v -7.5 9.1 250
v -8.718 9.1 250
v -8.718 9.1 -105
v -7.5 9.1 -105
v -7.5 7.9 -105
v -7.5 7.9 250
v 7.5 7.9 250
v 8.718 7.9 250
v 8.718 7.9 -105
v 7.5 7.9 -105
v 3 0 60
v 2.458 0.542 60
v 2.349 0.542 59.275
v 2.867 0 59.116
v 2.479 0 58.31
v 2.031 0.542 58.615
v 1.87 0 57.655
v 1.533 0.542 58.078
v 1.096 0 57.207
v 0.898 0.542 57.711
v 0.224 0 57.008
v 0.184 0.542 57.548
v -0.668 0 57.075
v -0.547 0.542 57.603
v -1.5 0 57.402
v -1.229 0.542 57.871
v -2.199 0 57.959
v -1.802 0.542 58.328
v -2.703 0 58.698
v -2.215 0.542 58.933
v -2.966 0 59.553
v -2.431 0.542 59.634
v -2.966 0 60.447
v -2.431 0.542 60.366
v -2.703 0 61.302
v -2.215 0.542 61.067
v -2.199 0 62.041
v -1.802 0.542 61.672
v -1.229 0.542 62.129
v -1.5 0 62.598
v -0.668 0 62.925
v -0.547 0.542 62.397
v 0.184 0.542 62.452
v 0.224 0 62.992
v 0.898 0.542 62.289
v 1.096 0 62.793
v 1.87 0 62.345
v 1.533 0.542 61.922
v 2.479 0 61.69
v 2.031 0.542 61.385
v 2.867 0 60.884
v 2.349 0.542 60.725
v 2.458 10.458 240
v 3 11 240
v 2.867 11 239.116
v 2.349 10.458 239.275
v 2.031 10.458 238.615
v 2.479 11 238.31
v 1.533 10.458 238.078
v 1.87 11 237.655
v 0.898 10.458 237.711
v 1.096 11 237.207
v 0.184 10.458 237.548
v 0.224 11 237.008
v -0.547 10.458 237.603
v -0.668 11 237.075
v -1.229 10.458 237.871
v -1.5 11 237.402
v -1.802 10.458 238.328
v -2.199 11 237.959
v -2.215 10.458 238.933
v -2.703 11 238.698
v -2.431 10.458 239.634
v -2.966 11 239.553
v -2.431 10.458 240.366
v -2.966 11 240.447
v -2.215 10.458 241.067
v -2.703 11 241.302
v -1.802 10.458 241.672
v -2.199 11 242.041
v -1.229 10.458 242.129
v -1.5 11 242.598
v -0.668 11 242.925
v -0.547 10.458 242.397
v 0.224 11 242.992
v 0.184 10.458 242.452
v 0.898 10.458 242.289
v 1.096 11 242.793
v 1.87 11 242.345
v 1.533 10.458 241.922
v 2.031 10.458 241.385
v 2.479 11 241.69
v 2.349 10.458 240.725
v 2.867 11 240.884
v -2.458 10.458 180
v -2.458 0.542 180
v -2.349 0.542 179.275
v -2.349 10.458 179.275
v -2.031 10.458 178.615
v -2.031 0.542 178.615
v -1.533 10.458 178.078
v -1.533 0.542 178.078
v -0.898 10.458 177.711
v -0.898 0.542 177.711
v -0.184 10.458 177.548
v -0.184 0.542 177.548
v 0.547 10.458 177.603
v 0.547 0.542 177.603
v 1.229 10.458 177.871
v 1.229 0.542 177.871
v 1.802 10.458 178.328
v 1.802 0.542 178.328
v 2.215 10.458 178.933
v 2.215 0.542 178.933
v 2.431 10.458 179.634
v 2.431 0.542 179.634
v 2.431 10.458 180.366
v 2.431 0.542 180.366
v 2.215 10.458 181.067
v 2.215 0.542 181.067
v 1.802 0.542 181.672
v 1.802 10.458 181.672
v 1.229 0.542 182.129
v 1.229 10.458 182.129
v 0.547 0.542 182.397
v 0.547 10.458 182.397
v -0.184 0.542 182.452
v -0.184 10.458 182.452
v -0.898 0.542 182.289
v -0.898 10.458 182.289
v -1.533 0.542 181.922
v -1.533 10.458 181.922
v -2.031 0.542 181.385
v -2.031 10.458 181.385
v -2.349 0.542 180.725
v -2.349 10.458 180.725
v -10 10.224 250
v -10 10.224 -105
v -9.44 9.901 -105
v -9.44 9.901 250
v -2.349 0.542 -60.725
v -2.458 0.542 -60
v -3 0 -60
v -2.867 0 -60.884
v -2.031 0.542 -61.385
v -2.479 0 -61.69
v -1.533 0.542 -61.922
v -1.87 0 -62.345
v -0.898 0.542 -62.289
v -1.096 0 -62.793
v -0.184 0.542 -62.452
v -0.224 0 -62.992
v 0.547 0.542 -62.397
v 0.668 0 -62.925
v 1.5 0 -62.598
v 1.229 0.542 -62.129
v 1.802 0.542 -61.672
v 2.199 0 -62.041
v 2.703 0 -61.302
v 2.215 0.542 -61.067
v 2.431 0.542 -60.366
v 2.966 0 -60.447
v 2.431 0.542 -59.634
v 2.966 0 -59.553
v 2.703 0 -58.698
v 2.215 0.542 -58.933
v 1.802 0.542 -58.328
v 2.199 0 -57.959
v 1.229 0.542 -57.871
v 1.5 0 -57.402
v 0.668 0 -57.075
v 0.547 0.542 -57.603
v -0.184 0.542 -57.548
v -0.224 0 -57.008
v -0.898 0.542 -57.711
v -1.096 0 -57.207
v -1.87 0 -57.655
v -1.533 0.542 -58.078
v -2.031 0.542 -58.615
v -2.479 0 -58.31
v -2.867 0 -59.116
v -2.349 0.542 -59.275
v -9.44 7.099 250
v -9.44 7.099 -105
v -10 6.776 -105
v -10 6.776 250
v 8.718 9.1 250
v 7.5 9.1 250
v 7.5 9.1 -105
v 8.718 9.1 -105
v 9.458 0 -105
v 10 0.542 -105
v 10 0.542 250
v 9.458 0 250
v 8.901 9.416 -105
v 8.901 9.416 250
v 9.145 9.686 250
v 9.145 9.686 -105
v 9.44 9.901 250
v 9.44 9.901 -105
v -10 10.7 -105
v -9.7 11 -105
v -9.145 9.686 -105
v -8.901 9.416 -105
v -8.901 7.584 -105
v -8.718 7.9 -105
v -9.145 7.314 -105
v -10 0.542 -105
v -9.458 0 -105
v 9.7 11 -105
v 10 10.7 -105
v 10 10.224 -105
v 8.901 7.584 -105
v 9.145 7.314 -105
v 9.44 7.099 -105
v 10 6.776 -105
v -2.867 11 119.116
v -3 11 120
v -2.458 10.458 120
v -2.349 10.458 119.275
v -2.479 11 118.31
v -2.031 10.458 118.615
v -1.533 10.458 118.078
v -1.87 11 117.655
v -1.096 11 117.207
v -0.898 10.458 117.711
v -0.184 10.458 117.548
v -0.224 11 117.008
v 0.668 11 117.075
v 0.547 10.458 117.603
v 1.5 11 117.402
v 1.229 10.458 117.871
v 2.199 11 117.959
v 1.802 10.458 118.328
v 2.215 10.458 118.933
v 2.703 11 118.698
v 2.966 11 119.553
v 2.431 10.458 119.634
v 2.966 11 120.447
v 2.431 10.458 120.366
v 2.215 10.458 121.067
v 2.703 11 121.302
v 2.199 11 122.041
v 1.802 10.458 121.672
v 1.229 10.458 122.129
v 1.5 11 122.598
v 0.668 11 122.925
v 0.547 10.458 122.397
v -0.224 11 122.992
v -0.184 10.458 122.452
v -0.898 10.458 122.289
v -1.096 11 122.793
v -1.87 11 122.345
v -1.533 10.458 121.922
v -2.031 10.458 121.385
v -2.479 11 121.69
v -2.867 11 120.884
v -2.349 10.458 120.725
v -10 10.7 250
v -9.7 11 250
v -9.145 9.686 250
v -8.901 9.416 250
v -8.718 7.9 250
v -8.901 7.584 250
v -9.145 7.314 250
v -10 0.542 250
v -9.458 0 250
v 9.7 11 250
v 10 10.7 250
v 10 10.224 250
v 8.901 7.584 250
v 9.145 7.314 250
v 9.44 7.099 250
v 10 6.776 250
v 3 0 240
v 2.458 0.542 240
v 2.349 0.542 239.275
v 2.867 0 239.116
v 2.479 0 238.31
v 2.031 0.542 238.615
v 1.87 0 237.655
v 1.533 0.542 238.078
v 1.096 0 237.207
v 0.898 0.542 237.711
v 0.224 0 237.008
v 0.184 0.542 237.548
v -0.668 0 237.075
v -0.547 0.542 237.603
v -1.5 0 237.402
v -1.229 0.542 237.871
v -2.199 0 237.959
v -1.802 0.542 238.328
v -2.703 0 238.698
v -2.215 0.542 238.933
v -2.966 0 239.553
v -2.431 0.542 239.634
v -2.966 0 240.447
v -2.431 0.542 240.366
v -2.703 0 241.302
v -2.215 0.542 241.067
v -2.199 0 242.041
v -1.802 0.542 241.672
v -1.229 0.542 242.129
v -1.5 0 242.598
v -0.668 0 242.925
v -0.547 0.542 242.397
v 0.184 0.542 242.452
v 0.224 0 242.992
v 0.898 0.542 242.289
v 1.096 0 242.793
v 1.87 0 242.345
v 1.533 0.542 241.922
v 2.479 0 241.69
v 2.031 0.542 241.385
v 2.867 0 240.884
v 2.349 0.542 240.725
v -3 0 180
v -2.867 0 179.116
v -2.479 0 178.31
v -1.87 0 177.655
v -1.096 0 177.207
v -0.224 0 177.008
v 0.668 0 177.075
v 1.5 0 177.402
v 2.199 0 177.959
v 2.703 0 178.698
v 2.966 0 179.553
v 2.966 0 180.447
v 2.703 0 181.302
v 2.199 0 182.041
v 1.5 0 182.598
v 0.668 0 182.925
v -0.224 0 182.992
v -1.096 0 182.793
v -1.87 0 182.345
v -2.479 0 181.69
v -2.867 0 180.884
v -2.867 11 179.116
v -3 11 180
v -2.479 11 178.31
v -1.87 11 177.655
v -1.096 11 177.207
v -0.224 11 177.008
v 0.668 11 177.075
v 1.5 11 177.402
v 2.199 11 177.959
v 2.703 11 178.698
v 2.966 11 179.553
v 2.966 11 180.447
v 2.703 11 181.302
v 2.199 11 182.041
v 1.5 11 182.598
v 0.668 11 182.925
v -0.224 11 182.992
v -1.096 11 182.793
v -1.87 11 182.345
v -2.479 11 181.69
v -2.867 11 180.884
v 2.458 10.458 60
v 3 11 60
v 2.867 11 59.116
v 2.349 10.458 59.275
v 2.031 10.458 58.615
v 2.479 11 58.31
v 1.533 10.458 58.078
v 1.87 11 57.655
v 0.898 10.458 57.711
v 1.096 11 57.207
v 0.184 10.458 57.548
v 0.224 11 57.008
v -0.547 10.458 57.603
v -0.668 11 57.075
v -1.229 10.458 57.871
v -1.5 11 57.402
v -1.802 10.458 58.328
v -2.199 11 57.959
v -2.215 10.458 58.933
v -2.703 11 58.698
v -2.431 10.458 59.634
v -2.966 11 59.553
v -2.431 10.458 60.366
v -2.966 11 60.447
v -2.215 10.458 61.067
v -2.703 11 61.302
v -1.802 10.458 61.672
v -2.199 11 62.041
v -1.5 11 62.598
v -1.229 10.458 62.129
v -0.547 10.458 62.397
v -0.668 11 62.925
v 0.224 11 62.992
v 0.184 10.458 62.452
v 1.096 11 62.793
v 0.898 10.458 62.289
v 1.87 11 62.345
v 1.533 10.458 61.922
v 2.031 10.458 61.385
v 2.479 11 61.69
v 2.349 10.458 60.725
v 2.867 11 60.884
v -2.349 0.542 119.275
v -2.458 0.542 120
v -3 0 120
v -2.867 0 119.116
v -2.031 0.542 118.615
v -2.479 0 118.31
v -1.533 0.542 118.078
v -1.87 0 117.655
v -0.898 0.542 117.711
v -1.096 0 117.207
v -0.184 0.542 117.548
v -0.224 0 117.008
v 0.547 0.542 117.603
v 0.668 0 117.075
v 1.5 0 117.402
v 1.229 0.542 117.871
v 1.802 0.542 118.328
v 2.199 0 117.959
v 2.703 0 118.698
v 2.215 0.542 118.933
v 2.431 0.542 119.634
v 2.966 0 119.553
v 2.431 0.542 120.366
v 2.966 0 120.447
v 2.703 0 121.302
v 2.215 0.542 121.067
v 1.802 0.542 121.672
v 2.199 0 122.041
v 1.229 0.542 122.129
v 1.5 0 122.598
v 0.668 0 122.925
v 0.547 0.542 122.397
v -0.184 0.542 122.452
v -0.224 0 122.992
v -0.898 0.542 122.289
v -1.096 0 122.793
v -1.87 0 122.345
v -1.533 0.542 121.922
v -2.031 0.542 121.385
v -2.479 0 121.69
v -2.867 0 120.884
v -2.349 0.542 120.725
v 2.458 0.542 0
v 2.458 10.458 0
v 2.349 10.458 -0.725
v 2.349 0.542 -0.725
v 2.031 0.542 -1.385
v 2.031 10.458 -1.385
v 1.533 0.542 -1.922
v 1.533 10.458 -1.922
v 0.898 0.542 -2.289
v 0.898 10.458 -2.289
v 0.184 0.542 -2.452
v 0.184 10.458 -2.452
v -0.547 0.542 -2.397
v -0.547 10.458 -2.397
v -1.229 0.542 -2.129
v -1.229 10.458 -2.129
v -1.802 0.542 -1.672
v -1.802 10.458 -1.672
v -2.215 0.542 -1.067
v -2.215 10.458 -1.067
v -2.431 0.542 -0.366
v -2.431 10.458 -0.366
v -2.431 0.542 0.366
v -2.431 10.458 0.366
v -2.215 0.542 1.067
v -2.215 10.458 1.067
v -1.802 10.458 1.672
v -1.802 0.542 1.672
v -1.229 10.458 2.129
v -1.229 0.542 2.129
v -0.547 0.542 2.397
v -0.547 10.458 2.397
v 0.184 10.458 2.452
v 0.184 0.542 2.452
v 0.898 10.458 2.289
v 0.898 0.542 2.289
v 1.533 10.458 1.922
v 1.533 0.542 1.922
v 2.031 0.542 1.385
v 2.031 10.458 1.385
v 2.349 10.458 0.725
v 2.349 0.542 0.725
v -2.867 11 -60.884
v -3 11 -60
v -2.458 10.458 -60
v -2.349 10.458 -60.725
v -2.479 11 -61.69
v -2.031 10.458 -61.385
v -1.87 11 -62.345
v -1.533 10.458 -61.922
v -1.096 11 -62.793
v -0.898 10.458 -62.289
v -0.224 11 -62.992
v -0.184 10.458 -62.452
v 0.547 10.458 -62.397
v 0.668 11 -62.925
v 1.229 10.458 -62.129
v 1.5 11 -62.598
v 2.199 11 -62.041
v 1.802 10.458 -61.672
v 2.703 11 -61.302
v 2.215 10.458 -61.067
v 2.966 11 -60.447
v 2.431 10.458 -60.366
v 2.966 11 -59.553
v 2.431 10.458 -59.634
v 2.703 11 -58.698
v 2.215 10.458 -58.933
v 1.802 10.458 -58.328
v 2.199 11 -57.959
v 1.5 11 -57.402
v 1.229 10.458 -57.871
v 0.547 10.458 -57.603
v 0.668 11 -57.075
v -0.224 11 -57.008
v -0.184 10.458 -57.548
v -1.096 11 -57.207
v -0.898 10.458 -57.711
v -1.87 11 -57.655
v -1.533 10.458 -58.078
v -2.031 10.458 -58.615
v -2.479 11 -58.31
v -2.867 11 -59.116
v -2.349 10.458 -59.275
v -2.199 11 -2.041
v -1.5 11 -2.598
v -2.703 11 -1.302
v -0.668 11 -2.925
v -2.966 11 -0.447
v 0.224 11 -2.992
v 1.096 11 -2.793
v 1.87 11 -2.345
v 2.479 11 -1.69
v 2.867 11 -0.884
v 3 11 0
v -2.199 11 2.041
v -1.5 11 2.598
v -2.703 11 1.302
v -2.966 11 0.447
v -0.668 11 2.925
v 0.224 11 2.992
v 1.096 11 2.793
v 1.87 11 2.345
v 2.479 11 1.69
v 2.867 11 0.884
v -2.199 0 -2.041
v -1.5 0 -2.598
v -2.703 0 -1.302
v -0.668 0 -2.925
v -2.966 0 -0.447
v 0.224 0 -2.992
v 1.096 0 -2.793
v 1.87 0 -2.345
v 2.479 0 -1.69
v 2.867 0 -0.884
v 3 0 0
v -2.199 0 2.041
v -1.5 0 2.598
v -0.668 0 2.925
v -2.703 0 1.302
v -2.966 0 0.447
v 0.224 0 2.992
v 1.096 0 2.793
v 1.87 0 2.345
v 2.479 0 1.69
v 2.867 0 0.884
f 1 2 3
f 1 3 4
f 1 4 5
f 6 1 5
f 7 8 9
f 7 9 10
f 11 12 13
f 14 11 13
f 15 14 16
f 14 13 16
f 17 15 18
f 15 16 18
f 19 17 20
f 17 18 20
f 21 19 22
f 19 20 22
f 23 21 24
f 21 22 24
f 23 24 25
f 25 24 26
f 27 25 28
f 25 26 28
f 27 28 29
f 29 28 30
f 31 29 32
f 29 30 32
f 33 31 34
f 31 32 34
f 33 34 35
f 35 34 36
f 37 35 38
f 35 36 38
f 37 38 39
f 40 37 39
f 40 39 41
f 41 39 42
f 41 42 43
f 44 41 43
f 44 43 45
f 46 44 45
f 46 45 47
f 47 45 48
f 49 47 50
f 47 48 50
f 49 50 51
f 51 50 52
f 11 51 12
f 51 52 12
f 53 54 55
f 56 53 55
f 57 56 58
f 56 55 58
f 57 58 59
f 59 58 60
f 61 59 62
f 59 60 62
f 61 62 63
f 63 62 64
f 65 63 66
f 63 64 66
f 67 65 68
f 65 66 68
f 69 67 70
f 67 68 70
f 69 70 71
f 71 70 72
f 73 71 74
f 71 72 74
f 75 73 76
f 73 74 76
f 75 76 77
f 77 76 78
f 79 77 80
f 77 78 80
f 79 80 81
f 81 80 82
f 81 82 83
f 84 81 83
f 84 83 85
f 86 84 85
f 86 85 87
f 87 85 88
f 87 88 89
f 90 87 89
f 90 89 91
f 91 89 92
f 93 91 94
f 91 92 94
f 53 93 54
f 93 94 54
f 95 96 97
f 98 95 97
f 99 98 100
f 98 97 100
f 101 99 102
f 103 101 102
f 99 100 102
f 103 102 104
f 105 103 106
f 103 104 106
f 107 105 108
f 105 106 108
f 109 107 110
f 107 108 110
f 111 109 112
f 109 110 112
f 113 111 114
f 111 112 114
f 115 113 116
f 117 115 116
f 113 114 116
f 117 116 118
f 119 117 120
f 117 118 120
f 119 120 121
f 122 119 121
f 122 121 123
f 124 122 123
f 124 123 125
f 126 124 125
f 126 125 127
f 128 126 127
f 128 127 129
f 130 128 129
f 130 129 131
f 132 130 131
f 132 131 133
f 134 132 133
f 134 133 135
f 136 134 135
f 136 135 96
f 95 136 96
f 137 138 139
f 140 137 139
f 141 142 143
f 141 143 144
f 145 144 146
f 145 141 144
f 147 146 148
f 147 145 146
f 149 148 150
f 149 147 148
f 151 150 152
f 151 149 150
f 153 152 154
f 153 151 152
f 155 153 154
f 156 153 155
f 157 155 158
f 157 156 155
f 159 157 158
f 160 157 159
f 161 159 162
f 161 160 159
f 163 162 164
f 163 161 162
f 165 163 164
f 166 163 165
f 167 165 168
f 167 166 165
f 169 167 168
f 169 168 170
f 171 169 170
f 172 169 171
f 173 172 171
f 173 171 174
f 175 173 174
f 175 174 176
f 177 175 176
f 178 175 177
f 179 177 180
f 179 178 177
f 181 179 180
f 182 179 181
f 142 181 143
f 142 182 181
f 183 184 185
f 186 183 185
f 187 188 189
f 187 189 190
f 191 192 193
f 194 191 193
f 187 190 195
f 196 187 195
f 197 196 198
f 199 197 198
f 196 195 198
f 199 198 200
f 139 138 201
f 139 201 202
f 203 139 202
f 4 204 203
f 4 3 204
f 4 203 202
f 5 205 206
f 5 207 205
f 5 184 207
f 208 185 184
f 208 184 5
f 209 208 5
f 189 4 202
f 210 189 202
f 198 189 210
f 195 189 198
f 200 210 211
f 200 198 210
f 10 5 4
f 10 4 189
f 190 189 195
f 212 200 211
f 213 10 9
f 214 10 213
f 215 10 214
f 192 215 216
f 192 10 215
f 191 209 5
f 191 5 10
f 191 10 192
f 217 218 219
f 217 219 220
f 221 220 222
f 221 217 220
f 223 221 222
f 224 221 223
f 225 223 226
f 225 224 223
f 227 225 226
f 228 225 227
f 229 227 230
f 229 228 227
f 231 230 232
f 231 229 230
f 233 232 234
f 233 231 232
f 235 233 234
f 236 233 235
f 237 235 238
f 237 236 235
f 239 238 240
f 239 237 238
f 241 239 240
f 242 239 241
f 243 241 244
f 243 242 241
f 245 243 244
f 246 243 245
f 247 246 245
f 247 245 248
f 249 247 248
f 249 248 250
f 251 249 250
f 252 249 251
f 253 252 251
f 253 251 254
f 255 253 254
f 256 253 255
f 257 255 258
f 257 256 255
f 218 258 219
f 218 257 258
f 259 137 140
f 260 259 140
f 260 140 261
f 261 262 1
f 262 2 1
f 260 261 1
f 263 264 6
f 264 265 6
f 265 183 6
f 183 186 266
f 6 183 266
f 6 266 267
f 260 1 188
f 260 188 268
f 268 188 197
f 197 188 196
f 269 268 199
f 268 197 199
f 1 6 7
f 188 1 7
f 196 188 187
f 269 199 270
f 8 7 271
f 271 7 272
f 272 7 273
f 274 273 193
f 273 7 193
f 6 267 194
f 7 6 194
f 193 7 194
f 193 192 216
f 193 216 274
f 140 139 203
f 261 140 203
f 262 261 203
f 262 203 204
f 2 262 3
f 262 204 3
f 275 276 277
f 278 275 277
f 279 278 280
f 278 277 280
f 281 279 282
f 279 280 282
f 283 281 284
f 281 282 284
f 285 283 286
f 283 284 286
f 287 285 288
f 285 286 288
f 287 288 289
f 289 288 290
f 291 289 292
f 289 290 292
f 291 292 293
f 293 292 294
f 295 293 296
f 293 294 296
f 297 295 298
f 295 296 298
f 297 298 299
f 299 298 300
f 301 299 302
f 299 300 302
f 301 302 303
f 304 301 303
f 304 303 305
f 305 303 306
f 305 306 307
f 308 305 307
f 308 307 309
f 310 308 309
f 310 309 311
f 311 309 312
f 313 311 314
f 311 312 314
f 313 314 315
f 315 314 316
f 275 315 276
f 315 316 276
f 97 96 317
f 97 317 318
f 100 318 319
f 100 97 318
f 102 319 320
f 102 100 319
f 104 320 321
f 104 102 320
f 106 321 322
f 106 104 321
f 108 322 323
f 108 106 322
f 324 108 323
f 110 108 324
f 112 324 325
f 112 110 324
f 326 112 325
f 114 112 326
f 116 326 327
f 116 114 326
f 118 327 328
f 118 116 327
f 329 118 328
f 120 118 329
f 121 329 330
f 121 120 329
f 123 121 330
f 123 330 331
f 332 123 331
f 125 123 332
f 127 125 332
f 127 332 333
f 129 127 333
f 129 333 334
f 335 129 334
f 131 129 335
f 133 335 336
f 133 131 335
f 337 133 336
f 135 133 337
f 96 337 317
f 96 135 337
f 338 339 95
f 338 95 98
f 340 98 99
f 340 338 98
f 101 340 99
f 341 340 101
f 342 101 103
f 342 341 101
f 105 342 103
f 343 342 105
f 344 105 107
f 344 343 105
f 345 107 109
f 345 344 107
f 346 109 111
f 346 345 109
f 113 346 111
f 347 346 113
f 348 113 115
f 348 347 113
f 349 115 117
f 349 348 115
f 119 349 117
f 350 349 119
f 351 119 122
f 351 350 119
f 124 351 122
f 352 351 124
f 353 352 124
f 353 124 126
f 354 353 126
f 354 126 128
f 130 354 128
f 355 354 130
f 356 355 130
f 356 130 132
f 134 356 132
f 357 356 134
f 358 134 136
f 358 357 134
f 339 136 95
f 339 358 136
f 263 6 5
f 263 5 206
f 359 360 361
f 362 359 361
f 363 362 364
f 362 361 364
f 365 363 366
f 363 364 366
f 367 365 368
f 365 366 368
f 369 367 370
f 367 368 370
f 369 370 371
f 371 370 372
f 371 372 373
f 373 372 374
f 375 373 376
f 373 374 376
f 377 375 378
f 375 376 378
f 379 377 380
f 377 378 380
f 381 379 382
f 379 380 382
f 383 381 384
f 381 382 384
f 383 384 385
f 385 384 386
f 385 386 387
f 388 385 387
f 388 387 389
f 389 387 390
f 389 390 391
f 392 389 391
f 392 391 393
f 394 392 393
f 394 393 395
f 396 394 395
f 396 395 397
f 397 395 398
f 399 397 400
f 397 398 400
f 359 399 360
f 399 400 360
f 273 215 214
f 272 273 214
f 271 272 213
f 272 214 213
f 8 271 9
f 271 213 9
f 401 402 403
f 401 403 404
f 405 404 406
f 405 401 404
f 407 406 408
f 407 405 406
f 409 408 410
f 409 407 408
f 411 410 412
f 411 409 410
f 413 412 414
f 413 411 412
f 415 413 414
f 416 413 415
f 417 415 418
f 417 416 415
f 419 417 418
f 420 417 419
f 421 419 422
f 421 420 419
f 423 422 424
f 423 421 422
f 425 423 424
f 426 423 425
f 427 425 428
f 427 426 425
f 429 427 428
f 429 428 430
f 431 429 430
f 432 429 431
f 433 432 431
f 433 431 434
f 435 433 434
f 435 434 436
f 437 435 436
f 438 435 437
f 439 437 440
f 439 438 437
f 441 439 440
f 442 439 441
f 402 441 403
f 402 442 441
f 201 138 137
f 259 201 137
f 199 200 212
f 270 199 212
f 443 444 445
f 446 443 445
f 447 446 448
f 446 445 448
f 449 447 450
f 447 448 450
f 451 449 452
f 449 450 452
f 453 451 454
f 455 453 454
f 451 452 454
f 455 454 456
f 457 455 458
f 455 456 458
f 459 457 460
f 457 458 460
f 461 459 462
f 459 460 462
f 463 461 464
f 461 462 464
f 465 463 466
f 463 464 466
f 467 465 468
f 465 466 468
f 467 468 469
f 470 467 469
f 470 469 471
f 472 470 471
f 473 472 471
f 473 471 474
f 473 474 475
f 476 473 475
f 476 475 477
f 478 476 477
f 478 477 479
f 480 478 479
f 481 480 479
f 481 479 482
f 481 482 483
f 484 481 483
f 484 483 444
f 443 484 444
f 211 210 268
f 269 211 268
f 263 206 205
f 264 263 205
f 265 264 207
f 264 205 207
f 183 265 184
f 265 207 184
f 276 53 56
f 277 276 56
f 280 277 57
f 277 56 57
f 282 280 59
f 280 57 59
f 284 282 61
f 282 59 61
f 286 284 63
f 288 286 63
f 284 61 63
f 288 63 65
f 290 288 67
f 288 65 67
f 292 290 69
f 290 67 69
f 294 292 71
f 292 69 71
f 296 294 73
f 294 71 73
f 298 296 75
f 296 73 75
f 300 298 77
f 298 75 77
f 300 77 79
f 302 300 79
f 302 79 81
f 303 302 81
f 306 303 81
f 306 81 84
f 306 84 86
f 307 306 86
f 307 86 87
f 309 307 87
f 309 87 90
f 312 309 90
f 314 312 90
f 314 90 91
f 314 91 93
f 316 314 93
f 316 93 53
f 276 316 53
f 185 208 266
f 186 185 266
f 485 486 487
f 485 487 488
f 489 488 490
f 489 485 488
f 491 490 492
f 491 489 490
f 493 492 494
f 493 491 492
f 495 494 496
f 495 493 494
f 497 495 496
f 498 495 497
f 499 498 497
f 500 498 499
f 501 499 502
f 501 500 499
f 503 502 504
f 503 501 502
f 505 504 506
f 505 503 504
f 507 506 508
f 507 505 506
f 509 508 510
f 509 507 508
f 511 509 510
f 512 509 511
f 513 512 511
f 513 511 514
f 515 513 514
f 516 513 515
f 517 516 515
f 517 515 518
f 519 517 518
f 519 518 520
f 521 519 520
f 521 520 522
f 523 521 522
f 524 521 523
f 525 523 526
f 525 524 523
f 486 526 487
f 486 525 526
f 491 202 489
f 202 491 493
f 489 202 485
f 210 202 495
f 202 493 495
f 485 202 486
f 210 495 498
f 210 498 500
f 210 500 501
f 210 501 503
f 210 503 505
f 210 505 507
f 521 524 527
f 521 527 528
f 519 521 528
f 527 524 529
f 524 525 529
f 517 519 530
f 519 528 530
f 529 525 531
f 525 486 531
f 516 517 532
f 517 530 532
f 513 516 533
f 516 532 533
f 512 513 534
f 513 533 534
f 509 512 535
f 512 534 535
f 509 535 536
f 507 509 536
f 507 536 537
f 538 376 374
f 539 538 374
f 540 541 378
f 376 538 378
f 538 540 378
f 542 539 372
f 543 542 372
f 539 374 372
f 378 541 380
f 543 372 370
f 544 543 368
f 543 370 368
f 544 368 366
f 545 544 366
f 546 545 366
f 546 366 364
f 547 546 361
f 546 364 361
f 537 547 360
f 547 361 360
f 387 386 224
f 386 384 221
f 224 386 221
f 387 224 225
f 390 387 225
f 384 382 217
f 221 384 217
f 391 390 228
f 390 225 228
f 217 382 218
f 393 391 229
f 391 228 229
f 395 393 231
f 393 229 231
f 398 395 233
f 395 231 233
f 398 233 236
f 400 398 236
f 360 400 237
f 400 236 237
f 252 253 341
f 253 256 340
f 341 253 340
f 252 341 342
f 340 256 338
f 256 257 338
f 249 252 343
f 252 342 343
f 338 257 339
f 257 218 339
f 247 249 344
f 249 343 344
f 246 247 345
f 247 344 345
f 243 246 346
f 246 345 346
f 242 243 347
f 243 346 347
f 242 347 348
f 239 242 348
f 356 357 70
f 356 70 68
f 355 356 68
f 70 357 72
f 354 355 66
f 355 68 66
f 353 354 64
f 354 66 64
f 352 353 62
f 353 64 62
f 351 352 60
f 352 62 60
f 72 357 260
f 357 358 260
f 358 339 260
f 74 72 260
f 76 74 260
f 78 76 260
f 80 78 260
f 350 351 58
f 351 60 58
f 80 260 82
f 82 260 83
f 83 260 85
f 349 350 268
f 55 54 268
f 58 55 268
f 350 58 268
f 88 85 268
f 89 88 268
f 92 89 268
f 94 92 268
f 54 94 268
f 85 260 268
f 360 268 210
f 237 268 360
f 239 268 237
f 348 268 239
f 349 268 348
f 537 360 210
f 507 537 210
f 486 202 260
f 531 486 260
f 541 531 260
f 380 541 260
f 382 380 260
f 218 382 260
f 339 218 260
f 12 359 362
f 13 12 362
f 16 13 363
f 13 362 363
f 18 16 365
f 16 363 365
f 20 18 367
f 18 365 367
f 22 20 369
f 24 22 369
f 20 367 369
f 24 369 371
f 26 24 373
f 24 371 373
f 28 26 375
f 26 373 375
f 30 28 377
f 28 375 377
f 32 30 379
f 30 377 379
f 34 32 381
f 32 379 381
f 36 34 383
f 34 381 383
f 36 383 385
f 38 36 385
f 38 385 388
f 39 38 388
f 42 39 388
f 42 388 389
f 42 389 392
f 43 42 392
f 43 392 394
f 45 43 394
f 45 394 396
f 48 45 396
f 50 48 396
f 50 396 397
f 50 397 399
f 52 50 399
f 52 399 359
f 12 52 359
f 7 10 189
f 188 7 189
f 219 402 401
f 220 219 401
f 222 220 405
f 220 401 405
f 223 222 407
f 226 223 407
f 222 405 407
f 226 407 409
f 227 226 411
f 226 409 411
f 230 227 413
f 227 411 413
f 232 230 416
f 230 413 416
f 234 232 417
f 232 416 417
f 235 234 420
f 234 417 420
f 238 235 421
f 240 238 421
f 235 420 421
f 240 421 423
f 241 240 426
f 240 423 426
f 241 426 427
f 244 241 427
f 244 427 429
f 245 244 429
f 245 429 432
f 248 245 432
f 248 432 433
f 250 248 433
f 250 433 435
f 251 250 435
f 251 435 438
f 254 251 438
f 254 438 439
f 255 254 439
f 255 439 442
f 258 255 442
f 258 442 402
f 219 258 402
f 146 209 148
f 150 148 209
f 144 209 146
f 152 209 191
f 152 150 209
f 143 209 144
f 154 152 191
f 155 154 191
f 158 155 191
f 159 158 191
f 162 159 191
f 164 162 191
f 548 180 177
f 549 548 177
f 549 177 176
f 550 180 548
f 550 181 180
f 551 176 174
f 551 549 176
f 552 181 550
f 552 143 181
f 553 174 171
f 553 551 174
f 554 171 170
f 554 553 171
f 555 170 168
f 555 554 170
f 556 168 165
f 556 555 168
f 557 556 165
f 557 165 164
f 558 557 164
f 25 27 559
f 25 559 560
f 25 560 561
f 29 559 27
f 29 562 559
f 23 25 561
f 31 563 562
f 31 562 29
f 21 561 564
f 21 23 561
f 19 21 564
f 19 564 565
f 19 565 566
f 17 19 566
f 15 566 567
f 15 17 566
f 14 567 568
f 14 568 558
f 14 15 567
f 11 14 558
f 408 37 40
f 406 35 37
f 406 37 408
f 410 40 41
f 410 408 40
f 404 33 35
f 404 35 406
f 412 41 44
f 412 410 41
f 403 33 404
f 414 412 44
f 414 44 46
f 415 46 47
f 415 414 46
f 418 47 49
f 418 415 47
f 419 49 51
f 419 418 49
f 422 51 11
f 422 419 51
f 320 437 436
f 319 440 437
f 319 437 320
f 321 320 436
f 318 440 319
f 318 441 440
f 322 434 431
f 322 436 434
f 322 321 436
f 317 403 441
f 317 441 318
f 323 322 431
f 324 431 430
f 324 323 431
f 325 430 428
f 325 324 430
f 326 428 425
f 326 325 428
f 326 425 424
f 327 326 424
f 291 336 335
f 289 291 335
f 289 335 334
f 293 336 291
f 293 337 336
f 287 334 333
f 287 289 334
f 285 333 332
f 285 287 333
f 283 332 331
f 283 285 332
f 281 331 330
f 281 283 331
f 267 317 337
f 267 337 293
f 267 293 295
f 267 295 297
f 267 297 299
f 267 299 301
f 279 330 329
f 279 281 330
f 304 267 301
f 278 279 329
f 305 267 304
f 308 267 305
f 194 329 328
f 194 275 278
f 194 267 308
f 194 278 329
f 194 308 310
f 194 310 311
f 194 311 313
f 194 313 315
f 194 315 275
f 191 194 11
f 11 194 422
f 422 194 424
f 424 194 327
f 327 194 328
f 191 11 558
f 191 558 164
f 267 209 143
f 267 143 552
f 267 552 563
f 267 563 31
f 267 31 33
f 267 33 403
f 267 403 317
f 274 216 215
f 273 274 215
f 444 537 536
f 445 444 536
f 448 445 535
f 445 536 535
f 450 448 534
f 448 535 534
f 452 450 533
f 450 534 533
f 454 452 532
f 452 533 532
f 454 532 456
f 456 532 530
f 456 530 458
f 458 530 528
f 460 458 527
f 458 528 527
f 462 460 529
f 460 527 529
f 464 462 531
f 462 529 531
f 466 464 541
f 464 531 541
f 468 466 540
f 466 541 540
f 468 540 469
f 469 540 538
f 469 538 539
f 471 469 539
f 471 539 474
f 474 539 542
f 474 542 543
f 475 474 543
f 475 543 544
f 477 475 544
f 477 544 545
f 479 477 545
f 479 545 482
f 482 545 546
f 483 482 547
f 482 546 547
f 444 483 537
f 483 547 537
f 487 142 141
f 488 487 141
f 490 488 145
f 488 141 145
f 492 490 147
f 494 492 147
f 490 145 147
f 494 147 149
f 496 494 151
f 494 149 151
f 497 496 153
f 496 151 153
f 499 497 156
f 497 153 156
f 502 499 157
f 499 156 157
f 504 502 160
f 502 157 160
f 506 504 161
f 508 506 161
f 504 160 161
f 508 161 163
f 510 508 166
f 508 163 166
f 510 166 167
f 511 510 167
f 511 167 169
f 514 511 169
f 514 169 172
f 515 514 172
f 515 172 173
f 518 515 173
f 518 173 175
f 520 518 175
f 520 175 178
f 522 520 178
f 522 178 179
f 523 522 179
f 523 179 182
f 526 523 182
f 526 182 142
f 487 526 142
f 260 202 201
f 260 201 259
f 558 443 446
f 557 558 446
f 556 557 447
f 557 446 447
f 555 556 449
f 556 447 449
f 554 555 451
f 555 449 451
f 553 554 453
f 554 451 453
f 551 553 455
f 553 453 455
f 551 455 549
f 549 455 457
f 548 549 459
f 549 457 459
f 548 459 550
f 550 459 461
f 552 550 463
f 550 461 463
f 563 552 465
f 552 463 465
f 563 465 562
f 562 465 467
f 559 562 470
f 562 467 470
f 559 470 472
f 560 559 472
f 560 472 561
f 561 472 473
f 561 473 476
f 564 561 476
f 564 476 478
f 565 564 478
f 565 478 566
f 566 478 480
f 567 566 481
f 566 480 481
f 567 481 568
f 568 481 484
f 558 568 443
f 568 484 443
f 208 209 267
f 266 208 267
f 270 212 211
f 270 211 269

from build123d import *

# Parameters (mm, degrees)
ESQUISSE1_W             = 20
ESQUISSE1_H             = 355
BOSS_EXTRU_1_DEPTH      = 11
ENL_V_MAT_EXTRU_1_DEPTH = 356.311131264
ENL_V_MAT_EXTRU_2_DEPTH = 356.311131264
ENL_V_MAT_EXTRU_3_DEPTH = 356.311131264
ENL_V_MAT_EXTRU_4_DEPTH = 356.311131264
PER_AGE1_D              = 4.917
PER_AGE1_DEPTH          = 11
PER_AGE2_D              = 4.917
CHANFREIN1_SIZE         = 0.5415
CHANFREIN2_SIZE         = 0.3


with BuildPart() as part:
    # Esquisse1 → Boss.-Extru.1 (new body)
    with BuildSketch(Plane.XZ):
        with Locations((0, 72.5)):
            Rectangle(ESQUISSE1_W, ESQUISSE1_H)
    extrude(amount=-BOSS_EXTRU_1_DEPTH)

    # Esquisse2 → Enlèv. mat.-Extru.1 (cut, through all)
    with BuildSketch(Plane(origin=(0, 0, -105), x_dir=(-1, 0, 0), z_dir=(0, 0, -1))):
        with BuildLine():
            Line((10, 7.9), (10, 10.22385))
            Line((10, 10.22385), (9.440021531, 9.900556887))
            ThreePointArc((9.440021531, 9.900556887), (9.015681976, 9.557293765), (8.71772889, 9.1))
            Line((8.71772889, 9.1), (7.5, 9.1))
            Line((7.5, 9.1), (7.5, 7.9))
            Line((7.5, 7.9), (10, 7.9))
        make_face()
    extrude(amount=-ENL_V_MAT_EXTRU_1_DEPTH, mode=Mode.SUBTRACT)

    # Esquisse3 → Enlèv. mat.-Extru.2 (cut, through all)
    with BuildSketch(Plane(origin=(0, 0, -105), x_dir=(-1, 0, 0), z_dir=(0, 0, -1))):
        with BuildLine():
            Line((9.440021531, 7.099443113), (10, 6.77615))
            Line((10, 6.77615), (10, 7.9))
            Line((10, 7.9), (8.71772889, 7.9))
            ThreePointArc((8.71772889, 7.9), (9.015681976, 7.442706235), (9.440021531, 7.099443113))
        make_face()
    extrude(amount=-ENL_V_MAT_EXTRU_2_DEPTH, mode=Mode.SUBTRACT)

    # Esquisse4 → Enlèv. mat.-Extru.3 (cut, through all)
    with BuildSketch(Plane(origin=(0, 0, -105), x_dir=(-1, 0, 0), z_dir=(0, 0, -1))):
        with BuildLine():
            Line((-10, 9.1), (-10, 6.77615))
            Line((-10, 6.77615), (-9.440021531, 7.099443113))
            ThreePointArc((-9.440021531, 7.099443113), (-9.015681976, 7.442706235), (-8.71772889, 7.9))
            Line((-8.71772889, 7.9), (-7.5, 7.9))
            Line((-7.5, 7.9), (-7.5, 9.1))
            Line((-7.5, 9.1), (-10, 9.1))
        make_face()
    extrude(amount=-ENL_V_MAT_EXTRU_3_DEPTH, mode=Mode.SUBTRACT)

    # Esquisse5 → Enlèv. mat.-Extru.4 (cut, through all)
    with BuildSketch(Plane(origin=(0, 0, -105), x_dir=(-1, 0, 0), z_dir=(0, 0, -1))):
        with BuildLine():
            Line((-9.440021531, 9.900556887), (-10, 10.22385))
            Line((-10, 10.22385), (-10, 9.1))
            Line((-10, 9.1), (-8.71772889, 9.1))
            ThreePointArc((-8.71772889, 9.1), (-9.015681976, 9.557293765), (-9.440021531, 9.900556887))
        make_face()
    extrude(amount=-ENL_V_MAT_EXTRU_4_DEPTH, mode=Mode.SUBTRACT)

    # Perçage1
    with Locations(Plane(origin=(0, 11, 0), x_dir=(1, 0, 0), z_dir=(0, 1, 0))):
        with Locations((0, -180), (0, -120), (0, 60), (0, 180)):
            Hole(PER_AGE1_D / 2, depth=PER_AGE1_DEPTH)

    # Perçage2 (through all)
    with Locations(Plane(origin=(0, 0, 0), x_dir=(-1, 0, 0), z_dir=(0, -1, 0))):
        with Locations((0, -240), (0, -60), (0, 0), (0, 120), (0, 240)):
            Hole(PER_AGE2_D / 2)

    # Chanfrein1
    chanfrein1_edges = [part.edges().sort_by_distance(p)[0] for p in [
        (-2.4585, 0, 0),
        (-2.4585, 11, 0),
        (-2.4585, 0, 60),
        (-2.4585, 11, 60),
        (-2.4585, 0, 240),
        (-2.4585, 11, 240),
        (10, 0, 72.5),
        (-10, 0, 72.5),
        (2.4585, 11, -60),
        (2.4585, 0, -60),
        (2.4585, 11, 120),
        (2.4585, 0, 120),
        (2.4585, 11, 180),
        (2.4585, 0, 180),
    ]]
    chamfer(chanfrein1_edges, length=CHANFREIN1_SIZE)

    # Chanfrein2
    chanfrein2_edges = [part.edges().sort_by_distance(p)[0] for p in [
        (10, 11, 72.5),
        (-10, 11, 72.5),
    ]]
    chamfer(chanfrein2_edges, length=CHANFREIN2_SIZE)


solid = part.part
